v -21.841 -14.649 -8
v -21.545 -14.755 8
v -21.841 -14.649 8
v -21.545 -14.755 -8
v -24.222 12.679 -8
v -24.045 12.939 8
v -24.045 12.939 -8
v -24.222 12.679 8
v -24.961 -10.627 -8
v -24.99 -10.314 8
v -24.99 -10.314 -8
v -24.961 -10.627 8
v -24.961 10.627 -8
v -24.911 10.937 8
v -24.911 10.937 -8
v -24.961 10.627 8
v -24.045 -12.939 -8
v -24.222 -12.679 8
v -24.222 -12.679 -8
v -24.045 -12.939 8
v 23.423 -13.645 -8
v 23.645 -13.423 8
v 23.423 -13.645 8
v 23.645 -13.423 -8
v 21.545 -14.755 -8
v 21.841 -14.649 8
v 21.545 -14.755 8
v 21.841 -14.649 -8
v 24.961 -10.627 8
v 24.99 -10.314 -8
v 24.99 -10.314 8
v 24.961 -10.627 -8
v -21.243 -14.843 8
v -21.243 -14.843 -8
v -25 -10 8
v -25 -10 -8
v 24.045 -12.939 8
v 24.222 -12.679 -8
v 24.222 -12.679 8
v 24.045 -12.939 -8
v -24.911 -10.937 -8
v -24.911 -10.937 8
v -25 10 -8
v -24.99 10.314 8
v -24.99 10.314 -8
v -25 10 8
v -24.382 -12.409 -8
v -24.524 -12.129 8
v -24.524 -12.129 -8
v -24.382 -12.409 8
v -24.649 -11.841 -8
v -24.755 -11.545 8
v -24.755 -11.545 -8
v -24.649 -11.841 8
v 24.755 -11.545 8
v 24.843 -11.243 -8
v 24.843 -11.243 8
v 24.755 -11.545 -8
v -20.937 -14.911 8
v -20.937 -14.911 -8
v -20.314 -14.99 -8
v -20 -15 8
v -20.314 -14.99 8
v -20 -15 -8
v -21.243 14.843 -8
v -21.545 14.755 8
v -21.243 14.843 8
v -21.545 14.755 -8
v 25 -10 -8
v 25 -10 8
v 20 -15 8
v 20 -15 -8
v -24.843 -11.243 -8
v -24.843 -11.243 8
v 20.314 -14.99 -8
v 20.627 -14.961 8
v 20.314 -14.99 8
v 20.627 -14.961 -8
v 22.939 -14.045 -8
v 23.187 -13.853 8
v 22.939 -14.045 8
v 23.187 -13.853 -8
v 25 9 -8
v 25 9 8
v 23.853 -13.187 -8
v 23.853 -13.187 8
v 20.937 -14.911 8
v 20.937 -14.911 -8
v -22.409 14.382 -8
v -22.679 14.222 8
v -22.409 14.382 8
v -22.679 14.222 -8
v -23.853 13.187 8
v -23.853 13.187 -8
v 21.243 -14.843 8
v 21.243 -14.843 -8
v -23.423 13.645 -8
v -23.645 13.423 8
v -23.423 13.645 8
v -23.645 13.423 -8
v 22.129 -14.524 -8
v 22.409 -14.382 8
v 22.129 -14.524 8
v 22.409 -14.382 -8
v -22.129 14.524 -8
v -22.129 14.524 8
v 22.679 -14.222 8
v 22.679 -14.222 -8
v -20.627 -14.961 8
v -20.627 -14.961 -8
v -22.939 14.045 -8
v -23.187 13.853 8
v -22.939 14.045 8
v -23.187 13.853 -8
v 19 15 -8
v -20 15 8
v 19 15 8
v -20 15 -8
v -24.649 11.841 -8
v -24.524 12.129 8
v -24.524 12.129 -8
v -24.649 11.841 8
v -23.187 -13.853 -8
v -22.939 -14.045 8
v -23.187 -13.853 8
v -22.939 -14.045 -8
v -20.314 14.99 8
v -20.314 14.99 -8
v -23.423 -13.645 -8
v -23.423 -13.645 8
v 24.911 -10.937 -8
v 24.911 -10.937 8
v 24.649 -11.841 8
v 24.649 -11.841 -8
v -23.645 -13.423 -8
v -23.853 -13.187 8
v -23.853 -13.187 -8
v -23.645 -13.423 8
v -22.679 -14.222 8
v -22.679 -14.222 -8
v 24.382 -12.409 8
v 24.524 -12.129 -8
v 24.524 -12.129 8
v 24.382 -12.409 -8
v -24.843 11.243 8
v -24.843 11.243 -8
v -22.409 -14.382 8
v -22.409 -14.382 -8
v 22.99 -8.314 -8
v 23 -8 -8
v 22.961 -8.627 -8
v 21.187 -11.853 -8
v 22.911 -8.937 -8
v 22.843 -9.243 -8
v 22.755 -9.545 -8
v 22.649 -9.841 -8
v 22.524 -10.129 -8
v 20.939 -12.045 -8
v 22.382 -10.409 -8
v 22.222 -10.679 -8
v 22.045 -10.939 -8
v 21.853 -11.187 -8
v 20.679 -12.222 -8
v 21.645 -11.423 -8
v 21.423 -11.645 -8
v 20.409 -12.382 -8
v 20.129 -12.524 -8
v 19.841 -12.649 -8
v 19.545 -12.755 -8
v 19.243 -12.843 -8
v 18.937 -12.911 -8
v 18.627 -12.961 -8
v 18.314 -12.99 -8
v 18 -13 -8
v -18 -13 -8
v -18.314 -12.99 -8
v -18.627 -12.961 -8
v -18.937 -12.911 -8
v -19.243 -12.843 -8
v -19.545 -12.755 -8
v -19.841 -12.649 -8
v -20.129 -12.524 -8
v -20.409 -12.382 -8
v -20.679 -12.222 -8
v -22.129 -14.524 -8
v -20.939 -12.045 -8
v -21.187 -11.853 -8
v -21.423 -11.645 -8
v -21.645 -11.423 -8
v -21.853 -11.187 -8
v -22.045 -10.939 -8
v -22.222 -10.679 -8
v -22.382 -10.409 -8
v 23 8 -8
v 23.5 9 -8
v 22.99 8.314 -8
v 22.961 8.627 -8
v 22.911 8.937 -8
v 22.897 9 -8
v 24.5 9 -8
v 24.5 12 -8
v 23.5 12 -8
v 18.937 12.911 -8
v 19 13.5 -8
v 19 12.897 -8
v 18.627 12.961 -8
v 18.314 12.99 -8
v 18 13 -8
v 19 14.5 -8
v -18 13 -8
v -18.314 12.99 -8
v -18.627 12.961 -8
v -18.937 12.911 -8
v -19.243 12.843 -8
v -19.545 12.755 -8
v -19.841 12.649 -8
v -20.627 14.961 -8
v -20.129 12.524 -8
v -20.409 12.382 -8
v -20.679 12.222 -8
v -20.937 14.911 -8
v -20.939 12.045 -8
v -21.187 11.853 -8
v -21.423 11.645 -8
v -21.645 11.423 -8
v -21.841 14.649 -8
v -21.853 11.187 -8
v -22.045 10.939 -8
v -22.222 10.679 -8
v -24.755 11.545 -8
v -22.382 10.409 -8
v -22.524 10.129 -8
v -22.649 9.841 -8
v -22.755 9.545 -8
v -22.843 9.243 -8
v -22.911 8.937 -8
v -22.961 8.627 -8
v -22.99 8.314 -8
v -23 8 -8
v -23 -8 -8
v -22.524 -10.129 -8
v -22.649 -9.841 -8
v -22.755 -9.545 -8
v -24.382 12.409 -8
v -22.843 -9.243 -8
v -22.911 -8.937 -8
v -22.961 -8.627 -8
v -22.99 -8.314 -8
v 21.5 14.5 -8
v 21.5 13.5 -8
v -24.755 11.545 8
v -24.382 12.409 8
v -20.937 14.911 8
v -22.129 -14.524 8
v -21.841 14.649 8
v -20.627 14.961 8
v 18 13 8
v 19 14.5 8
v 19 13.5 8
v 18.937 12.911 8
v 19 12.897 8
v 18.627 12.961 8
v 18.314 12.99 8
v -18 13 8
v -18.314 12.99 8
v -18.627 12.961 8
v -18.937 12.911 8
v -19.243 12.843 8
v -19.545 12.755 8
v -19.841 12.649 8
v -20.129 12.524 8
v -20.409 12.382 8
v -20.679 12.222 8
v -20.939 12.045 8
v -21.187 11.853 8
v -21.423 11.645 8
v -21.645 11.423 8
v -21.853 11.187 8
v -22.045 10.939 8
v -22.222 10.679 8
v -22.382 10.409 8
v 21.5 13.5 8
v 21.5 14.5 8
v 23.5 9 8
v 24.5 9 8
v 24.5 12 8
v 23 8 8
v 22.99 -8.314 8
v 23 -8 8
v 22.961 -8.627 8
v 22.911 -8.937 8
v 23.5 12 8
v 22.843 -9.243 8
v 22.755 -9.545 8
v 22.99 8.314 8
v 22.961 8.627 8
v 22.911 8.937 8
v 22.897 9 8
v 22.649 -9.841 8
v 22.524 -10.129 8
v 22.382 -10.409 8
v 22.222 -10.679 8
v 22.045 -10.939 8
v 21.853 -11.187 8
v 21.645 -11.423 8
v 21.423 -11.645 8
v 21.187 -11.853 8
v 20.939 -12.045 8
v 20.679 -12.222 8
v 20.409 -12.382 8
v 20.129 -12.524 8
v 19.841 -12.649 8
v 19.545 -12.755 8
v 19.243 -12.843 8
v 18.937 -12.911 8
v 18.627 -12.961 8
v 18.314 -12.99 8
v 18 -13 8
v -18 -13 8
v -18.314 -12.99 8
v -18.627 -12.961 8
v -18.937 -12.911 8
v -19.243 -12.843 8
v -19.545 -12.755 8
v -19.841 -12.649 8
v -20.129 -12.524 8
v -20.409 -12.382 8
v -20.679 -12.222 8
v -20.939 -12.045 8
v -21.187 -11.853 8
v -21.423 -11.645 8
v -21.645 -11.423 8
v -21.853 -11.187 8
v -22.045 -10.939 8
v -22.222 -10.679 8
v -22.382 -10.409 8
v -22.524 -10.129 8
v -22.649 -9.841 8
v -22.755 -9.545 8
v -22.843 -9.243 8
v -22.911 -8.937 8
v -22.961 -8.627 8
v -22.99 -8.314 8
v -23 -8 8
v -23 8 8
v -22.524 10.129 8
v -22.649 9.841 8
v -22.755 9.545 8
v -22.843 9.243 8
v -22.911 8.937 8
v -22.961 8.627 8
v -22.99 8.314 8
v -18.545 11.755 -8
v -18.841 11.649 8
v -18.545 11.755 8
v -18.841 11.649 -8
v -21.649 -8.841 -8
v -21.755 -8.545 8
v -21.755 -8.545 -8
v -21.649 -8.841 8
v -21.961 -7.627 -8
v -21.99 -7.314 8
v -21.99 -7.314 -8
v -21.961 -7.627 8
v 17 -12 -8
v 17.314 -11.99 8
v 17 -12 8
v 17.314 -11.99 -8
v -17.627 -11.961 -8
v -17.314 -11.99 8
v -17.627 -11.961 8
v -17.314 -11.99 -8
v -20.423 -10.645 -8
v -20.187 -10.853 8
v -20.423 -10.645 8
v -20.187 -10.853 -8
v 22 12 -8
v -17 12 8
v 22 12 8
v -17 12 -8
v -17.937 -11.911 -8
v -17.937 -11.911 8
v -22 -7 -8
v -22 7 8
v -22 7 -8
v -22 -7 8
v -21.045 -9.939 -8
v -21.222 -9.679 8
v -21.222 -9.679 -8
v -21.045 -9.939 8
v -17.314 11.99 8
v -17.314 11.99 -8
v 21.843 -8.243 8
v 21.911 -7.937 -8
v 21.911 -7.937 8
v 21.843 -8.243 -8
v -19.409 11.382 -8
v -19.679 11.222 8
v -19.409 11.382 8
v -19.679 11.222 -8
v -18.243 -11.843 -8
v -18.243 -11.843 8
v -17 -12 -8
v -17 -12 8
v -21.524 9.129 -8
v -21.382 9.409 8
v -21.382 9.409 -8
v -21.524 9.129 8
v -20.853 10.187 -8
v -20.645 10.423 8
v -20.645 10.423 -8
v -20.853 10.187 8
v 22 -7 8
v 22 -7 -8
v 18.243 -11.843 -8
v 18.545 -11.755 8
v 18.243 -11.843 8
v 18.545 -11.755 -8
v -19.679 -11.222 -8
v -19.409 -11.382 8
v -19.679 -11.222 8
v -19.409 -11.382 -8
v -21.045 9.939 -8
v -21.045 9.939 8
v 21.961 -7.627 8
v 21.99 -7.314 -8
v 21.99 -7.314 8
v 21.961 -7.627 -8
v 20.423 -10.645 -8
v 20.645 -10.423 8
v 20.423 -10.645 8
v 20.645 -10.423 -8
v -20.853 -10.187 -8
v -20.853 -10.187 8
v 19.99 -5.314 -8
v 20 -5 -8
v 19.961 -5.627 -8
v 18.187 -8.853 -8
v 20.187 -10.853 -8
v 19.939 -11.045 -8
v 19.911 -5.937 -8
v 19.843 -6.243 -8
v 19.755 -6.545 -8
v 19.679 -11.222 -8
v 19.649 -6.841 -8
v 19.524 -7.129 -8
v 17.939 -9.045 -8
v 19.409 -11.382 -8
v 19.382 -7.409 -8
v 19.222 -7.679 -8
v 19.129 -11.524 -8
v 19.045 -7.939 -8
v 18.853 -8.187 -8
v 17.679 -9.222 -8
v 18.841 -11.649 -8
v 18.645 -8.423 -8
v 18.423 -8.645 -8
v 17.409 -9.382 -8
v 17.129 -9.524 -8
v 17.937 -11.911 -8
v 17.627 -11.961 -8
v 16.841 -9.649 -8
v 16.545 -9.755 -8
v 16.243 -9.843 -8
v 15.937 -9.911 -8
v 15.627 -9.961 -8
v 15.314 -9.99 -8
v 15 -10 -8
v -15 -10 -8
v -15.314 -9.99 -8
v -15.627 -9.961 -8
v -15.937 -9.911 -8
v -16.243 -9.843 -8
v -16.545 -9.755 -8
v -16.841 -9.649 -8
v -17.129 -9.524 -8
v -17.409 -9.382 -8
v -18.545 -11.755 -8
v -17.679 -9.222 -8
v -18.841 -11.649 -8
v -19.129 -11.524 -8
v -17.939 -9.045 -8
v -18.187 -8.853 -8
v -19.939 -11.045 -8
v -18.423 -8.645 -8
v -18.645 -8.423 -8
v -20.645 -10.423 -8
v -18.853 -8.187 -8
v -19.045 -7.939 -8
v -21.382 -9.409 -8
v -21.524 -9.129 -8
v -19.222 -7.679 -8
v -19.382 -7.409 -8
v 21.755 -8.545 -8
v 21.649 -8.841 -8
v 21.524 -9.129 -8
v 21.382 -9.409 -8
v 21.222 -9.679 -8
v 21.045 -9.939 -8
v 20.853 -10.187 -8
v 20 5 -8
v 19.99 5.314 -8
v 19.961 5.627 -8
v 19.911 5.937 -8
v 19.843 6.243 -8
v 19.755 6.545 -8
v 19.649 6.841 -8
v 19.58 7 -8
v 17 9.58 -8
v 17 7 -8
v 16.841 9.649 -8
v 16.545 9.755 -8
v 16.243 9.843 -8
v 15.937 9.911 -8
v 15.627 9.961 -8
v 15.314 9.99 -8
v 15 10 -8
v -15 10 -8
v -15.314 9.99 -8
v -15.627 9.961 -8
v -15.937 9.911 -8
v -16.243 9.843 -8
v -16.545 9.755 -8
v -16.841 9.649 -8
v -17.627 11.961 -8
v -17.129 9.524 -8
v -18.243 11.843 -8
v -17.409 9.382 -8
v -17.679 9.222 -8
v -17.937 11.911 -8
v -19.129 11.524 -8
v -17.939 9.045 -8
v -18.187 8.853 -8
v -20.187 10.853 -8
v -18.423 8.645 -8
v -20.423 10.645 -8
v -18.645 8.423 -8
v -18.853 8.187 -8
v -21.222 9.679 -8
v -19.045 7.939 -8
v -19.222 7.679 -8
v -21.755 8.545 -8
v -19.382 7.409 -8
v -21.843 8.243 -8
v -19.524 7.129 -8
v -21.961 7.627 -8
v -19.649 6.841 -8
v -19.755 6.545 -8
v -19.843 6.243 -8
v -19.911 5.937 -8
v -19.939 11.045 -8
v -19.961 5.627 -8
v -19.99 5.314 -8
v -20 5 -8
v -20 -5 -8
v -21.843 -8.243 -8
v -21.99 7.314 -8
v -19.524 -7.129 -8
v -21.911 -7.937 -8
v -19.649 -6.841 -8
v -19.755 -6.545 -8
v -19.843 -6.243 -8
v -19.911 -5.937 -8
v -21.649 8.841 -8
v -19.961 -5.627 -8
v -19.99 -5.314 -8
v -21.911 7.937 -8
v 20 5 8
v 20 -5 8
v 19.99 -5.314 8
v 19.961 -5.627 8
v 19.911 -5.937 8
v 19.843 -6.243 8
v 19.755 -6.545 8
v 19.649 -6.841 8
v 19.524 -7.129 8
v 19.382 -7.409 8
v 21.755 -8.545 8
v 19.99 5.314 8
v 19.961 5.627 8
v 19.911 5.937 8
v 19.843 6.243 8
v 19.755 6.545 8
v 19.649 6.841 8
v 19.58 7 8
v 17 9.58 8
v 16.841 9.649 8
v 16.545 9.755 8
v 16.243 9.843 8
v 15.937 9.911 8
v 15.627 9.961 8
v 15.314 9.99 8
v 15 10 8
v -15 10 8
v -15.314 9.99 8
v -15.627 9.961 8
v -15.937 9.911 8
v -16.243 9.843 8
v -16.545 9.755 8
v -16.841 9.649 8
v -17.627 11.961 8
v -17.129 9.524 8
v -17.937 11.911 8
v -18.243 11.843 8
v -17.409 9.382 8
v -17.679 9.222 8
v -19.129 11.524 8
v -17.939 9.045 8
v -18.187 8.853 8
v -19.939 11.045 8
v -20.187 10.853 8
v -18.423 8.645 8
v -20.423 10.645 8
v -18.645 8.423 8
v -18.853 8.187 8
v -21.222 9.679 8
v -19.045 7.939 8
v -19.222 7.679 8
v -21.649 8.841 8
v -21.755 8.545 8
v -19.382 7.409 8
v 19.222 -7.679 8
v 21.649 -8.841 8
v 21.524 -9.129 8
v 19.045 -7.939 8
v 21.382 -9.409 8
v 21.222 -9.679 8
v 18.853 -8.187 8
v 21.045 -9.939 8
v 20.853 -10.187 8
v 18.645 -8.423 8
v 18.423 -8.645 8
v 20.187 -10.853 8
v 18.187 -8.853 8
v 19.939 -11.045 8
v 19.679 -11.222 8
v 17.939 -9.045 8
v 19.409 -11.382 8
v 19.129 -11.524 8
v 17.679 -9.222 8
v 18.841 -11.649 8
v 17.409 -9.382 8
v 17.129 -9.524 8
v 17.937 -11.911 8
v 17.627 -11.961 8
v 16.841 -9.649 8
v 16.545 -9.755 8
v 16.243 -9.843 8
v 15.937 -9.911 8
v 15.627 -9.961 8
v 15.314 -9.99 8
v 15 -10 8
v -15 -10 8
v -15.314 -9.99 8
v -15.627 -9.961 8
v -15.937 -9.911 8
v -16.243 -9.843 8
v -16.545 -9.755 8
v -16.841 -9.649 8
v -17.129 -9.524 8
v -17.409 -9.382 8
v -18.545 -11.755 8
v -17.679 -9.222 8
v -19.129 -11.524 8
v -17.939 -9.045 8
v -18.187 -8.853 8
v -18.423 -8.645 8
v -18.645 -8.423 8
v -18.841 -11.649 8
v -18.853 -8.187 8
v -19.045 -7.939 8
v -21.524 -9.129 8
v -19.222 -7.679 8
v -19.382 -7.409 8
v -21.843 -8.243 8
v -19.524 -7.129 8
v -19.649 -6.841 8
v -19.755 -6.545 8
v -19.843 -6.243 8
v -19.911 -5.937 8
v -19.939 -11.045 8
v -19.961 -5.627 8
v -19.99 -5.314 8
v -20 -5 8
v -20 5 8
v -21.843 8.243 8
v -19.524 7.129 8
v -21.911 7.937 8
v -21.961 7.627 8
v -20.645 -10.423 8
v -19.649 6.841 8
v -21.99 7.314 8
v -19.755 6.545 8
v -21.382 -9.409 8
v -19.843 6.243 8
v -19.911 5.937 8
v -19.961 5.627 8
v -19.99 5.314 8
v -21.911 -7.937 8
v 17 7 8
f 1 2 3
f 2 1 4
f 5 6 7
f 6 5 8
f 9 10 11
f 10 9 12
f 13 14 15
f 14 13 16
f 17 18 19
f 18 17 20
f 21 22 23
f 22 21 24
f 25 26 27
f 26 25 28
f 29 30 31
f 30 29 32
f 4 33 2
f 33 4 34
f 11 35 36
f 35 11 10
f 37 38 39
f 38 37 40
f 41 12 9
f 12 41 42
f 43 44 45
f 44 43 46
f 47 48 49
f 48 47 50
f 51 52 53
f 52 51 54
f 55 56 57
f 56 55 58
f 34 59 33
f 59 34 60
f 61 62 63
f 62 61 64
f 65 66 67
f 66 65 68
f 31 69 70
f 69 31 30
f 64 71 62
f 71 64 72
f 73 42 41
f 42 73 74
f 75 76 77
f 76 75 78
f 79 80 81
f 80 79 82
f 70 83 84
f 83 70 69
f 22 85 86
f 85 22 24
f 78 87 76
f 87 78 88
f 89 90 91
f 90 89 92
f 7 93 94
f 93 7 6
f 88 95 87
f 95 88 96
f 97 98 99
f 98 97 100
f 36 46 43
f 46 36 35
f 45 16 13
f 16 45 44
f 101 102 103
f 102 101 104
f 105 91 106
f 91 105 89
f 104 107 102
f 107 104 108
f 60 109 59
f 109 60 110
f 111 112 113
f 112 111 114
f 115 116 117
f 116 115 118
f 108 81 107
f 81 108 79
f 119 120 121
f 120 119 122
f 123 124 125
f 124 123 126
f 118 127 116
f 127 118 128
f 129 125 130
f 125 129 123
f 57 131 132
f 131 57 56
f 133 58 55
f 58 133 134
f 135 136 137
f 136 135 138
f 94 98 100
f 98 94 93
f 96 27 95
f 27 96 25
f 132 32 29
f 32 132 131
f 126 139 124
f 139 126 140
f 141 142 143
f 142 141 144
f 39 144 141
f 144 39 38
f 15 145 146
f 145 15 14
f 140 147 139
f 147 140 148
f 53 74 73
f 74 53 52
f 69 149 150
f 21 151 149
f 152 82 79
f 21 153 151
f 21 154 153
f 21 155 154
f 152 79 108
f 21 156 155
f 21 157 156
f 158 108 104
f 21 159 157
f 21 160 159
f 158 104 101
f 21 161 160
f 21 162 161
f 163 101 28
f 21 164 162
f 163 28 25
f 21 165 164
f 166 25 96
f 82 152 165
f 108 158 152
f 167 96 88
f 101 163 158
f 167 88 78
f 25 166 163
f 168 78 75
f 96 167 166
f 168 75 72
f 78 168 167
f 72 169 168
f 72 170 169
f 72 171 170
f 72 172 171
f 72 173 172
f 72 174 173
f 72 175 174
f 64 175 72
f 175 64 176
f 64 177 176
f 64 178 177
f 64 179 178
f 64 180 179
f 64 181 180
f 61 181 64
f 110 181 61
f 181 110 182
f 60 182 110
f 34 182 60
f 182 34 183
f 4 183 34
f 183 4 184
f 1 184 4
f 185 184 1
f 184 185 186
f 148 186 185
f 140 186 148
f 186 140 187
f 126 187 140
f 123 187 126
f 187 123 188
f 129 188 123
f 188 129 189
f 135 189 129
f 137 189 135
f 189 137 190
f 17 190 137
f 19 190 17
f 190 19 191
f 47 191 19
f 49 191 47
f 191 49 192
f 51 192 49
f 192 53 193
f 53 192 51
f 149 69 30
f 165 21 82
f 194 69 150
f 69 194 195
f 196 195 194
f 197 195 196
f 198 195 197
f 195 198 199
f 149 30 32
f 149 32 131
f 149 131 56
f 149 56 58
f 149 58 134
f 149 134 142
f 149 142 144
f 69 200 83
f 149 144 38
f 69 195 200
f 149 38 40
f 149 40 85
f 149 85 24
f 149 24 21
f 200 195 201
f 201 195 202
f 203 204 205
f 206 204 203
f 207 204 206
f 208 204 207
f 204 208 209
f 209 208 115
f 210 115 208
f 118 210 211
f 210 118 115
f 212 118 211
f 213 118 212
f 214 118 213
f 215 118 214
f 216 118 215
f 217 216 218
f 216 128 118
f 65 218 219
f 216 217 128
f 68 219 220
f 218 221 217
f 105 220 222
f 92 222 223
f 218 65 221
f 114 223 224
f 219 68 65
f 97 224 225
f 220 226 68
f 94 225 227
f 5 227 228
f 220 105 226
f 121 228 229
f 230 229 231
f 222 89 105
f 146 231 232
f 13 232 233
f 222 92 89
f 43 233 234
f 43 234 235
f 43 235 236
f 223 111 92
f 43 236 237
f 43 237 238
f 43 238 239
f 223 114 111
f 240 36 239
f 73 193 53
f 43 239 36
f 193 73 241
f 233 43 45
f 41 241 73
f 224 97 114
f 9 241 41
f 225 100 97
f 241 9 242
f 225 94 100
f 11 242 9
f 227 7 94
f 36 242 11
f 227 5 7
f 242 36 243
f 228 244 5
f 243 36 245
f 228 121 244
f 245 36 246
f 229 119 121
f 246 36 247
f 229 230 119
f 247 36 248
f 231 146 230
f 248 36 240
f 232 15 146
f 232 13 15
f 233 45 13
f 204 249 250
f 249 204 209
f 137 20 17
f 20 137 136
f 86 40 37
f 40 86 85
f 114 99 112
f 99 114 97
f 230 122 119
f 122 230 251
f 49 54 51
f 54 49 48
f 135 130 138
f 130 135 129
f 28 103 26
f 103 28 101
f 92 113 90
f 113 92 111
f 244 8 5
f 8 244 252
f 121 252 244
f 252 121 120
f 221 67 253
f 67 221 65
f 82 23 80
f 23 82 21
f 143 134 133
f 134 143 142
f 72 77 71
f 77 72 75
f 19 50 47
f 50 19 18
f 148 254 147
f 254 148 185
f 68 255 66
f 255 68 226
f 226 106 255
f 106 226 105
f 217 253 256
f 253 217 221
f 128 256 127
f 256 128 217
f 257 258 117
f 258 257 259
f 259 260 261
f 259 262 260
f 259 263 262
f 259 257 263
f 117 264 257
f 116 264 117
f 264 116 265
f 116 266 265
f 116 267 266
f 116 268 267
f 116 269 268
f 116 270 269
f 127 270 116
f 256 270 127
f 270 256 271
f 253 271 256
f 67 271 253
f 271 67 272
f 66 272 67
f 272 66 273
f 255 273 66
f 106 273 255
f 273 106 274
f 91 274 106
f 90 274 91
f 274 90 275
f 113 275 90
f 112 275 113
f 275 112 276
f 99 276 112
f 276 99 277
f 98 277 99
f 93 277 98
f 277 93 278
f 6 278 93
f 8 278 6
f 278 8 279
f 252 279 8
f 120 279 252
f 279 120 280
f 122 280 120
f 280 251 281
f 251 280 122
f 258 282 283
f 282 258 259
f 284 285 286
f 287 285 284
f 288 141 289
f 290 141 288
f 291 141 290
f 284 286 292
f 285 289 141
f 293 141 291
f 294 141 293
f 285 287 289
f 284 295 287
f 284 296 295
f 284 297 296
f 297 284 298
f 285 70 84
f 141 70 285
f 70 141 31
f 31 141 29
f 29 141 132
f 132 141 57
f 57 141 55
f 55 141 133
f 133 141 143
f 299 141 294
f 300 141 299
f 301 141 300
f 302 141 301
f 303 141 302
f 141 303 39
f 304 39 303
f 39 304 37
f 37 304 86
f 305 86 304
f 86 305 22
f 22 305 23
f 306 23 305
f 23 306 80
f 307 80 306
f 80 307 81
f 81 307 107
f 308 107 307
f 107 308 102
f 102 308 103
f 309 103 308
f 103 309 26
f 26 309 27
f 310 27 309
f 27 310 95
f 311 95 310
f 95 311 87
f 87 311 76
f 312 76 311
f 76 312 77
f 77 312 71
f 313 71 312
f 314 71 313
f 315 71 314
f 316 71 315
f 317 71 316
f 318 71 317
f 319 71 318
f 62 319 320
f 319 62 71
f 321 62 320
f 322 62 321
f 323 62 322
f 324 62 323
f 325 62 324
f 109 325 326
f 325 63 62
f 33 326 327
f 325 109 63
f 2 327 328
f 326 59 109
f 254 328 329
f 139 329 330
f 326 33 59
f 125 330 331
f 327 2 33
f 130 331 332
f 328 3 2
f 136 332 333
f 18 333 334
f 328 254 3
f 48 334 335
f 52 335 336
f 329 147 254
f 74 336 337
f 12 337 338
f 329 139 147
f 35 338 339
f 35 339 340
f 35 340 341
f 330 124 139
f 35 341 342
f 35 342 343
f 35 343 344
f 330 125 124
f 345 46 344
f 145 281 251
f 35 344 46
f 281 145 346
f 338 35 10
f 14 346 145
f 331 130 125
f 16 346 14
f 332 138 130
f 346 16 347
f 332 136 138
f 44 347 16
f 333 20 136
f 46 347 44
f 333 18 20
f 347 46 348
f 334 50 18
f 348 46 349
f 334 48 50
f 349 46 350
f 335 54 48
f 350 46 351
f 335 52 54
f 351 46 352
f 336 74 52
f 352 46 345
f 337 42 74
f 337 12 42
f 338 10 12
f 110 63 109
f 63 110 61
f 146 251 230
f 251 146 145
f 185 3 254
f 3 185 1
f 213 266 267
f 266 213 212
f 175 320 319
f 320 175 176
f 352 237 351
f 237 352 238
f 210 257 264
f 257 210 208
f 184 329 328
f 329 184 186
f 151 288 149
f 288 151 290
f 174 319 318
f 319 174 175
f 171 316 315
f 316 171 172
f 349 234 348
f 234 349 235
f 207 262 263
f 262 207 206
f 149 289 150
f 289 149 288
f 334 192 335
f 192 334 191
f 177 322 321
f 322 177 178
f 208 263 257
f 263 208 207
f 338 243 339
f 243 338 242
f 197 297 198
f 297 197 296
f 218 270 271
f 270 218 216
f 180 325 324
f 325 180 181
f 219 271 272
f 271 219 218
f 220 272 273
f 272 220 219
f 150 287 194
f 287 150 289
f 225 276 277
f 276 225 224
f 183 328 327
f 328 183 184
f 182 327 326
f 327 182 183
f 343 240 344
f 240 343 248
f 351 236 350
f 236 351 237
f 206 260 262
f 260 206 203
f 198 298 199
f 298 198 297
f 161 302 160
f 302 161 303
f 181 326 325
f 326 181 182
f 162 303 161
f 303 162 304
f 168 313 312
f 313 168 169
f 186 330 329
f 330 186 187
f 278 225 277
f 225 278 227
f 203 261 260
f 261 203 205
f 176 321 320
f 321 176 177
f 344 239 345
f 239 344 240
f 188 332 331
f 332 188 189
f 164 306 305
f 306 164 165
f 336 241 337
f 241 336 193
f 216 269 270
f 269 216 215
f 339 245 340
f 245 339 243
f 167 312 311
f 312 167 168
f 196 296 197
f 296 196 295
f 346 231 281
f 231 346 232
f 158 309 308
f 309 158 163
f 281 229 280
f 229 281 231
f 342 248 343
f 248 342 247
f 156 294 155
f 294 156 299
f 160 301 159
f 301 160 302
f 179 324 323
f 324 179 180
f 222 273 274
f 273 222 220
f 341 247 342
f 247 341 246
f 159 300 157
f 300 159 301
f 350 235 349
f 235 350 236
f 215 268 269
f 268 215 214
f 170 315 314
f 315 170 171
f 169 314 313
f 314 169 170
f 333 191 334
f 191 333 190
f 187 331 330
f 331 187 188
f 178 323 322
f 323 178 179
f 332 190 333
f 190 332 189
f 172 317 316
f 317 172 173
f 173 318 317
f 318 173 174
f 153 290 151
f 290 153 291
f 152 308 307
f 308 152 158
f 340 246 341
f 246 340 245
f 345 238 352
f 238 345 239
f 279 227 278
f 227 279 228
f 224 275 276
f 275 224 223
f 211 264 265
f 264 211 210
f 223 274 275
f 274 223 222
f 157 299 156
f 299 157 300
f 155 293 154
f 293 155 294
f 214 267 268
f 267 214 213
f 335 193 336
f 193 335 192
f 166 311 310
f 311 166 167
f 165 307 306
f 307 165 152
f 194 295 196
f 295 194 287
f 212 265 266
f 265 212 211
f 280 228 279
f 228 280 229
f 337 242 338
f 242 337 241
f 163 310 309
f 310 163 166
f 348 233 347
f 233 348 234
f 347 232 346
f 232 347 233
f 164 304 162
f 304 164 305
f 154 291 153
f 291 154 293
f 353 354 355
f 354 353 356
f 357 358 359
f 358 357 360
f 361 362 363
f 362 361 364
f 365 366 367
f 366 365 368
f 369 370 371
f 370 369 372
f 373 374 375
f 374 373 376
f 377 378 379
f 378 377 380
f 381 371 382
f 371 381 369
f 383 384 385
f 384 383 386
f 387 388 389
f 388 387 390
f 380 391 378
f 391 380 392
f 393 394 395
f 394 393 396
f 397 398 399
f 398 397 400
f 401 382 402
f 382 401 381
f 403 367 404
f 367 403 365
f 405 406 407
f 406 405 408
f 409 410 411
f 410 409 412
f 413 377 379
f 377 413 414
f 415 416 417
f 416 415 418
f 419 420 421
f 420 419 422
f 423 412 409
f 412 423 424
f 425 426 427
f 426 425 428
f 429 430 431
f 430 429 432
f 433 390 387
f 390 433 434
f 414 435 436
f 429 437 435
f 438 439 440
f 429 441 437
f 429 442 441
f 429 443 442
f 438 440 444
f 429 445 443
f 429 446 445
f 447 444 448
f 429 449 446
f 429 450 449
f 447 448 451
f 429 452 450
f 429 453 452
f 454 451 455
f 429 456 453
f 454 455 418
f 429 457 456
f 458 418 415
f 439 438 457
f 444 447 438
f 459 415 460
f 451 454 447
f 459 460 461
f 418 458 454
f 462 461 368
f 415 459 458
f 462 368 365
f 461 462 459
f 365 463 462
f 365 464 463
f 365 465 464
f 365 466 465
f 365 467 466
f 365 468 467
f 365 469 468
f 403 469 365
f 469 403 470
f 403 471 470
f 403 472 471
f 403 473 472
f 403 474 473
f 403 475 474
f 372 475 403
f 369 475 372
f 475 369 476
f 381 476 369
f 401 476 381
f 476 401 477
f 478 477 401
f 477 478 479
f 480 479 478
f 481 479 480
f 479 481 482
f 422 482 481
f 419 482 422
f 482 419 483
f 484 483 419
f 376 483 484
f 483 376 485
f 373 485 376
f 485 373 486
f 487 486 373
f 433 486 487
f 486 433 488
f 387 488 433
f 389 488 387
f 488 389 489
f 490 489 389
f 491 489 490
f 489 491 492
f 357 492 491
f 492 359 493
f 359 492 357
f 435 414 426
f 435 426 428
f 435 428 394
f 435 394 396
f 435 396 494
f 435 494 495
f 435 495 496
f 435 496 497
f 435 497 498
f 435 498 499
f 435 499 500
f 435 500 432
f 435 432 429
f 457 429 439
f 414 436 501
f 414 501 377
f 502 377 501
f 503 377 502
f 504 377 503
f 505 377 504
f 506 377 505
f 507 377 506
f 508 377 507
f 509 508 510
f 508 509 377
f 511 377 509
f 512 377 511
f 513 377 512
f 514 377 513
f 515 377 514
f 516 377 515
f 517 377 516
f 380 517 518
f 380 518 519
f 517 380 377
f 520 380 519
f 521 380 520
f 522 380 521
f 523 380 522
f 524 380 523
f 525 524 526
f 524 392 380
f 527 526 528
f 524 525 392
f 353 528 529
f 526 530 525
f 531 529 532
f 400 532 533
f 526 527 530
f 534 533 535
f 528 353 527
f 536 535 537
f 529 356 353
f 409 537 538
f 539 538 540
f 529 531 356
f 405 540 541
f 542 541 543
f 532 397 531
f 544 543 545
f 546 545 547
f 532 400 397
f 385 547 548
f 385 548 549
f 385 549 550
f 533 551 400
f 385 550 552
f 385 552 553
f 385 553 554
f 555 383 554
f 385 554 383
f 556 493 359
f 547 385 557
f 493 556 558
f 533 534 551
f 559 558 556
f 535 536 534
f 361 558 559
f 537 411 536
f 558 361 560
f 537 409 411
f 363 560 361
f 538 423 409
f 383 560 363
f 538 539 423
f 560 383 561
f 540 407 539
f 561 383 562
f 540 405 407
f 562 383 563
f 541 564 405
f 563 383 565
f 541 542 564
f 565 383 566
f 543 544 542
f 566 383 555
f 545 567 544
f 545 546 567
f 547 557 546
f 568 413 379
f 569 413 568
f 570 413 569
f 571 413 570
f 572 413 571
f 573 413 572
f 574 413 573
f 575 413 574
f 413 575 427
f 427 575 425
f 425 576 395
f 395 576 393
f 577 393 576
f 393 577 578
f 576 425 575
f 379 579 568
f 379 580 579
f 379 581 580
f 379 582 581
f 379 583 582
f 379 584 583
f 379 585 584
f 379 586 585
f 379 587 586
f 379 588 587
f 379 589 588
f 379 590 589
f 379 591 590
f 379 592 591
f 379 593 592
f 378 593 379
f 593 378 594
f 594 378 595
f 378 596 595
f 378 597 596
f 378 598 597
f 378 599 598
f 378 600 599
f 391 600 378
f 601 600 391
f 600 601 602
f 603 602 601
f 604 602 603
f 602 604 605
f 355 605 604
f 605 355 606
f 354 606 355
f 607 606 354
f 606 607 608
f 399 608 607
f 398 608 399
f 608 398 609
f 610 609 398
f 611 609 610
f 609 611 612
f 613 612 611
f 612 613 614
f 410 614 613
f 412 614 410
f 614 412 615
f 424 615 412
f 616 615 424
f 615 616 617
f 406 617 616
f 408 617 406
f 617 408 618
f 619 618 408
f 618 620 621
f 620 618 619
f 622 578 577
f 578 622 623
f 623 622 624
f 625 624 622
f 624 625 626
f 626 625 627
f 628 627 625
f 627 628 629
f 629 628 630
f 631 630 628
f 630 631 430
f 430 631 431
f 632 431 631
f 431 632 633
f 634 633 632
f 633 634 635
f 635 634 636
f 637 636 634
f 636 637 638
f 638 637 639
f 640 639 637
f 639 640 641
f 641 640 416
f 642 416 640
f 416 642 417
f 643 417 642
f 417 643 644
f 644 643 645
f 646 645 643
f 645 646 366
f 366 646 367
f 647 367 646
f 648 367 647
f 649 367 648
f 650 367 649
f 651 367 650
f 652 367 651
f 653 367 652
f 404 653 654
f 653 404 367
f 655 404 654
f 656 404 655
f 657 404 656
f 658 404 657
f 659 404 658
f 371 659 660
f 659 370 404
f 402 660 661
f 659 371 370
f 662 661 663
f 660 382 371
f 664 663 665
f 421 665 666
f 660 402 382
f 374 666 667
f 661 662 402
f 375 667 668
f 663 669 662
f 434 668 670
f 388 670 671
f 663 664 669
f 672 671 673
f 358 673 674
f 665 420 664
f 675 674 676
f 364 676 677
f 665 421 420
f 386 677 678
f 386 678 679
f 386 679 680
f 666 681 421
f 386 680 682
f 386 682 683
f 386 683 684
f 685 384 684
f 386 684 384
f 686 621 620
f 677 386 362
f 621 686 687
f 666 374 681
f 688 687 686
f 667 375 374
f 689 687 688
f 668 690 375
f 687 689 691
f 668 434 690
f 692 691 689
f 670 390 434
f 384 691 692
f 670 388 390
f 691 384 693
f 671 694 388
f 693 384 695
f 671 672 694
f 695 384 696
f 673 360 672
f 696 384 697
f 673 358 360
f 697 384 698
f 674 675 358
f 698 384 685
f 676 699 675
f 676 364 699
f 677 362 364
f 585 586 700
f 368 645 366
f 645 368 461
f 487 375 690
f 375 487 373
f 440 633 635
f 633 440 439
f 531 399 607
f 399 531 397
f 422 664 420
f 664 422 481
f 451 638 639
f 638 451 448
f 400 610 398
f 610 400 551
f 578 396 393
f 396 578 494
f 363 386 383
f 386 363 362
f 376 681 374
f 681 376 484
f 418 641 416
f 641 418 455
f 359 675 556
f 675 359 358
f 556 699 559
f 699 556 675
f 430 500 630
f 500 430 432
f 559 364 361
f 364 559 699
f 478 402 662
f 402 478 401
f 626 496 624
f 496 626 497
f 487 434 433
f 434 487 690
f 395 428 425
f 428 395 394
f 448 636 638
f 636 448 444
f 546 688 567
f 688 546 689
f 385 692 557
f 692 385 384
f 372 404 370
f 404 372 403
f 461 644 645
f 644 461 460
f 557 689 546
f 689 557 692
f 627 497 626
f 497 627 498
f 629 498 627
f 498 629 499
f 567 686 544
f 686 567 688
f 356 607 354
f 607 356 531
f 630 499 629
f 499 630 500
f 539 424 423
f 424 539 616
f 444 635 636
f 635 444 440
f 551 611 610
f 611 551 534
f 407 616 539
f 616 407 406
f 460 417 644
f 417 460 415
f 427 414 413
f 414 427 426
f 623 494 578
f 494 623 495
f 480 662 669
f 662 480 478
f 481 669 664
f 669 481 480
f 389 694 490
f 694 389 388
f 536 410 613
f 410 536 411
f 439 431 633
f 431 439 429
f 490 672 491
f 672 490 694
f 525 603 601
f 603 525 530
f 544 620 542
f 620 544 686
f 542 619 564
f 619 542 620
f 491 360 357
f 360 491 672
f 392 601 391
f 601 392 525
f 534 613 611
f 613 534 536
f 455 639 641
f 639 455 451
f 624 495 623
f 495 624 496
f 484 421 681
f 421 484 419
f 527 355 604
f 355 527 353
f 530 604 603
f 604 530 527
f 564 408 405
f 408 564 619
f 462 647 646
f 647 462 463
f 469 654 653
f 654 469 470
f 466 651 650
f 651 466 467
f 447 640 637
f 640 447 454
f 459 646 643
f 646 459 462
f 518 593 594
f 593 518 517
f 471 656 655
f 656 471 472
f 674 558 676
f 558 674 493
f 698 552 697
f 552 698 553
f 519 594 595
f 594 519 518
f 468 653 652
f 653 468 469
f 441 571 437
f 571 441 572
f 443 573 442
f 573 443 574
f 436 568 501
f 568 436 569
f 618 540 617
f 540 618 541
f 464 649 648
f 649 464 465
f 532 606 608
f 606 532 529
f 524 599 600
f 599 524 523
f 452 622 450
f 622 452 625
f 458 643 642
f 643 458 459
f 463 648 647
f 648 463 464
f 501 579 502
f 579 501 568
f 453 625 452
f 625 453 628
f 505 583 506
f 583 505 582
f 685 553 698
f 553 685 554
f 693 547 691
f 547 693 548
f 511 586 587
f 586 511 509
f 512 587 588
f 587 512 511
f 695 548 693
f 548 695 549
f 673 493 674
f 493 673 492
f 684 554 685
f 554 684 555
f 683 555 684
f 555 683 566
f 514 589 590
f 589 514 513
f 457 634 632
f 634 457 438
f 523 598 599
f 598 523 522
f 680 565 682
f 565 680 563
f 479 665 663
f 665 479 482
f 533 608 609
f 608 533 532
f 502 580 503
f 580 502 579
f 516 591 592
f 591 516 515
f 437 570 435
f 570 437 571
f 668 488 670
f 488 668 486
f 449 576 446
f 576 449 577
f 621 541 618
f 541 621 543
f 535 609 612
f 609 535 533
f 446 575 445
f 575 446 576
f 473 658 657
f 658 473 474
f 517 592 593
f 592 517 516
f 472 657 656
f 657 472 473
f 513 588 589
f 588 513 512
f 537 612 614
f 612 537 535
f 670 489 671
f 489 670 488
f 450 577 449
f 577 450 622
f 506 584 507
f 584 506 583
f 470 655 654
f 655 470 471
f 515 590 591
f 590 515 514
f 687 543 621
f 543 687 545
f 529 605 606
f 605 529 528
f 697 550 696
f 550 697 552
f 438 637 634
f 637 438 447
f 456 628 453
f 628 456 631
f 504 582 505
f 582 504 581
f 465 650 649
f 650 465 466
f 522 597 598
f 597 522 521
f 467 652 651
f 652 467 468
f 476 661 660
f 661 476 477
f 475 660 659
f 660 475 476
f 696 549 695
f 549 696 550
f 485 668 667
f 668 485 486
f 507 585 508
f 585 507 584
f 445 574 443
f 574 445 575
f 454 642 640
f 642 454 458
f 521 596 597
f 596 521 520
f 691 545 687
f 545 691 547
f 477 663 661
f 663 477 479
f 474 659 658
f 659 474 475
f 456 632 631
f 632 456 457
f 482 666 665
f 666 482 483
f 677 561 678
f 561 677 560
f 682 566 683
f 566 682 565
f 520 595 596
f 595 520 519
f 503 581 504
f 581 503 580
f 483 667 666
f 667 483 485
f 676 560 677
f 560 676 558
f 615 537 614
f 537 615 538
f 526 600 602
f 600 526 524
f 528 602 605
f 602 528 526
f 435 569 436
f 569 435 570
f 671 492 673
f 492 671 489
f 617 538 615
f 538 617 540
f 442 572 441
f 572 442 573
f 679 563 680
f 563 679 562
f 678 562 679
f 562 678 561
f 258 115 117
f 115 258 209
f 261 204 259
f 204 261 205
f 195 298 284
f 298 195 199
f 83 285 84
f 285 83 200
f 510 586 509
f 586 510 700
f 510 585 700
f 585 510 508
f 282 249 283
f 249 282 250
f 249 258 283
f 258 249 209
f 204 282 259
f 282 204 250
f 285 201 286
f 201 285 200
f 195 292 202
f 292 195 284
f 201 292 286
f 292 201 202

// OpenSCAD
module boxTracks(outerL, outerW, depth, radiusCorner, trackSize, thickness, innerFill){
  difference(){
    union(){
      difference(){
        minkowski(){
          cube([outerL-radiusCorner*2,outerW-radiusCorner*2,depth], true);
          translate([0,0,-1/2])cylinder(r=radiusCorner,h=1,$fn=100);
        }

        translate([0,0,0])
        minkowski(){
          cube([outerL-radiusCorner*2-thickness*2,outerW-radiusCorner*2-thickness*2,depth+1], true);
          translate([0,0,-1/2])cylinder(r=radiusCorner,h=1,$fn=100);
        }
      }

      difference(){
        union(){
          minkowski(){
            cube([outerL-radiusCorner*2-thickness*2-trackSize*2,outerW-radiusCorner*2-thickness*2-trackSize*2,depth], true);
            translate([0,0,-1/2])cylinder(r=radiusCorner,h=1,$fn=100);
          }
        }

        if(innerFill){
          translate([0,0,0])
            minkowski(){
              cube([outerL-radiusCorner*2-thickness*4-trackSize*2,outerW-radiusCorner*2-thickness*4-trackSize*2,depth+1], true);
              translate([0,0,-1/2])cylinder(r=radiusCorner,h=1,$fn=100);
            }
          }
      }
    }
    translate([(outerL-radiusCorner)/2,(outerW-radiusCorner)/2,0])
      cube([radiusCorner+thickness,radiusCorner+thickness,depth*2],true);
  }
  //color([1,1,1]){
    translate([(outerL-radiusCorner-thickness*2-trackSize*2)/2,(outerW-radiusCorner-thickness*2-trackSize*2)/2,0])
      cube([radiusCorner,radiusCorner,depth+1],true);
    translate([(outerL-thickness)/2-4.5,(outerW-thickness)/2,0])
      cube([radiusCorner-1,1,depth+1],true);
    translate([(outerL-thickness)/2,(outerW)/2-5,0])
      cube([1,radiusCorner-1,depth+1],true);
  //}
}

boxTracks(50, 30, 15, 5, 1, 2, true);
